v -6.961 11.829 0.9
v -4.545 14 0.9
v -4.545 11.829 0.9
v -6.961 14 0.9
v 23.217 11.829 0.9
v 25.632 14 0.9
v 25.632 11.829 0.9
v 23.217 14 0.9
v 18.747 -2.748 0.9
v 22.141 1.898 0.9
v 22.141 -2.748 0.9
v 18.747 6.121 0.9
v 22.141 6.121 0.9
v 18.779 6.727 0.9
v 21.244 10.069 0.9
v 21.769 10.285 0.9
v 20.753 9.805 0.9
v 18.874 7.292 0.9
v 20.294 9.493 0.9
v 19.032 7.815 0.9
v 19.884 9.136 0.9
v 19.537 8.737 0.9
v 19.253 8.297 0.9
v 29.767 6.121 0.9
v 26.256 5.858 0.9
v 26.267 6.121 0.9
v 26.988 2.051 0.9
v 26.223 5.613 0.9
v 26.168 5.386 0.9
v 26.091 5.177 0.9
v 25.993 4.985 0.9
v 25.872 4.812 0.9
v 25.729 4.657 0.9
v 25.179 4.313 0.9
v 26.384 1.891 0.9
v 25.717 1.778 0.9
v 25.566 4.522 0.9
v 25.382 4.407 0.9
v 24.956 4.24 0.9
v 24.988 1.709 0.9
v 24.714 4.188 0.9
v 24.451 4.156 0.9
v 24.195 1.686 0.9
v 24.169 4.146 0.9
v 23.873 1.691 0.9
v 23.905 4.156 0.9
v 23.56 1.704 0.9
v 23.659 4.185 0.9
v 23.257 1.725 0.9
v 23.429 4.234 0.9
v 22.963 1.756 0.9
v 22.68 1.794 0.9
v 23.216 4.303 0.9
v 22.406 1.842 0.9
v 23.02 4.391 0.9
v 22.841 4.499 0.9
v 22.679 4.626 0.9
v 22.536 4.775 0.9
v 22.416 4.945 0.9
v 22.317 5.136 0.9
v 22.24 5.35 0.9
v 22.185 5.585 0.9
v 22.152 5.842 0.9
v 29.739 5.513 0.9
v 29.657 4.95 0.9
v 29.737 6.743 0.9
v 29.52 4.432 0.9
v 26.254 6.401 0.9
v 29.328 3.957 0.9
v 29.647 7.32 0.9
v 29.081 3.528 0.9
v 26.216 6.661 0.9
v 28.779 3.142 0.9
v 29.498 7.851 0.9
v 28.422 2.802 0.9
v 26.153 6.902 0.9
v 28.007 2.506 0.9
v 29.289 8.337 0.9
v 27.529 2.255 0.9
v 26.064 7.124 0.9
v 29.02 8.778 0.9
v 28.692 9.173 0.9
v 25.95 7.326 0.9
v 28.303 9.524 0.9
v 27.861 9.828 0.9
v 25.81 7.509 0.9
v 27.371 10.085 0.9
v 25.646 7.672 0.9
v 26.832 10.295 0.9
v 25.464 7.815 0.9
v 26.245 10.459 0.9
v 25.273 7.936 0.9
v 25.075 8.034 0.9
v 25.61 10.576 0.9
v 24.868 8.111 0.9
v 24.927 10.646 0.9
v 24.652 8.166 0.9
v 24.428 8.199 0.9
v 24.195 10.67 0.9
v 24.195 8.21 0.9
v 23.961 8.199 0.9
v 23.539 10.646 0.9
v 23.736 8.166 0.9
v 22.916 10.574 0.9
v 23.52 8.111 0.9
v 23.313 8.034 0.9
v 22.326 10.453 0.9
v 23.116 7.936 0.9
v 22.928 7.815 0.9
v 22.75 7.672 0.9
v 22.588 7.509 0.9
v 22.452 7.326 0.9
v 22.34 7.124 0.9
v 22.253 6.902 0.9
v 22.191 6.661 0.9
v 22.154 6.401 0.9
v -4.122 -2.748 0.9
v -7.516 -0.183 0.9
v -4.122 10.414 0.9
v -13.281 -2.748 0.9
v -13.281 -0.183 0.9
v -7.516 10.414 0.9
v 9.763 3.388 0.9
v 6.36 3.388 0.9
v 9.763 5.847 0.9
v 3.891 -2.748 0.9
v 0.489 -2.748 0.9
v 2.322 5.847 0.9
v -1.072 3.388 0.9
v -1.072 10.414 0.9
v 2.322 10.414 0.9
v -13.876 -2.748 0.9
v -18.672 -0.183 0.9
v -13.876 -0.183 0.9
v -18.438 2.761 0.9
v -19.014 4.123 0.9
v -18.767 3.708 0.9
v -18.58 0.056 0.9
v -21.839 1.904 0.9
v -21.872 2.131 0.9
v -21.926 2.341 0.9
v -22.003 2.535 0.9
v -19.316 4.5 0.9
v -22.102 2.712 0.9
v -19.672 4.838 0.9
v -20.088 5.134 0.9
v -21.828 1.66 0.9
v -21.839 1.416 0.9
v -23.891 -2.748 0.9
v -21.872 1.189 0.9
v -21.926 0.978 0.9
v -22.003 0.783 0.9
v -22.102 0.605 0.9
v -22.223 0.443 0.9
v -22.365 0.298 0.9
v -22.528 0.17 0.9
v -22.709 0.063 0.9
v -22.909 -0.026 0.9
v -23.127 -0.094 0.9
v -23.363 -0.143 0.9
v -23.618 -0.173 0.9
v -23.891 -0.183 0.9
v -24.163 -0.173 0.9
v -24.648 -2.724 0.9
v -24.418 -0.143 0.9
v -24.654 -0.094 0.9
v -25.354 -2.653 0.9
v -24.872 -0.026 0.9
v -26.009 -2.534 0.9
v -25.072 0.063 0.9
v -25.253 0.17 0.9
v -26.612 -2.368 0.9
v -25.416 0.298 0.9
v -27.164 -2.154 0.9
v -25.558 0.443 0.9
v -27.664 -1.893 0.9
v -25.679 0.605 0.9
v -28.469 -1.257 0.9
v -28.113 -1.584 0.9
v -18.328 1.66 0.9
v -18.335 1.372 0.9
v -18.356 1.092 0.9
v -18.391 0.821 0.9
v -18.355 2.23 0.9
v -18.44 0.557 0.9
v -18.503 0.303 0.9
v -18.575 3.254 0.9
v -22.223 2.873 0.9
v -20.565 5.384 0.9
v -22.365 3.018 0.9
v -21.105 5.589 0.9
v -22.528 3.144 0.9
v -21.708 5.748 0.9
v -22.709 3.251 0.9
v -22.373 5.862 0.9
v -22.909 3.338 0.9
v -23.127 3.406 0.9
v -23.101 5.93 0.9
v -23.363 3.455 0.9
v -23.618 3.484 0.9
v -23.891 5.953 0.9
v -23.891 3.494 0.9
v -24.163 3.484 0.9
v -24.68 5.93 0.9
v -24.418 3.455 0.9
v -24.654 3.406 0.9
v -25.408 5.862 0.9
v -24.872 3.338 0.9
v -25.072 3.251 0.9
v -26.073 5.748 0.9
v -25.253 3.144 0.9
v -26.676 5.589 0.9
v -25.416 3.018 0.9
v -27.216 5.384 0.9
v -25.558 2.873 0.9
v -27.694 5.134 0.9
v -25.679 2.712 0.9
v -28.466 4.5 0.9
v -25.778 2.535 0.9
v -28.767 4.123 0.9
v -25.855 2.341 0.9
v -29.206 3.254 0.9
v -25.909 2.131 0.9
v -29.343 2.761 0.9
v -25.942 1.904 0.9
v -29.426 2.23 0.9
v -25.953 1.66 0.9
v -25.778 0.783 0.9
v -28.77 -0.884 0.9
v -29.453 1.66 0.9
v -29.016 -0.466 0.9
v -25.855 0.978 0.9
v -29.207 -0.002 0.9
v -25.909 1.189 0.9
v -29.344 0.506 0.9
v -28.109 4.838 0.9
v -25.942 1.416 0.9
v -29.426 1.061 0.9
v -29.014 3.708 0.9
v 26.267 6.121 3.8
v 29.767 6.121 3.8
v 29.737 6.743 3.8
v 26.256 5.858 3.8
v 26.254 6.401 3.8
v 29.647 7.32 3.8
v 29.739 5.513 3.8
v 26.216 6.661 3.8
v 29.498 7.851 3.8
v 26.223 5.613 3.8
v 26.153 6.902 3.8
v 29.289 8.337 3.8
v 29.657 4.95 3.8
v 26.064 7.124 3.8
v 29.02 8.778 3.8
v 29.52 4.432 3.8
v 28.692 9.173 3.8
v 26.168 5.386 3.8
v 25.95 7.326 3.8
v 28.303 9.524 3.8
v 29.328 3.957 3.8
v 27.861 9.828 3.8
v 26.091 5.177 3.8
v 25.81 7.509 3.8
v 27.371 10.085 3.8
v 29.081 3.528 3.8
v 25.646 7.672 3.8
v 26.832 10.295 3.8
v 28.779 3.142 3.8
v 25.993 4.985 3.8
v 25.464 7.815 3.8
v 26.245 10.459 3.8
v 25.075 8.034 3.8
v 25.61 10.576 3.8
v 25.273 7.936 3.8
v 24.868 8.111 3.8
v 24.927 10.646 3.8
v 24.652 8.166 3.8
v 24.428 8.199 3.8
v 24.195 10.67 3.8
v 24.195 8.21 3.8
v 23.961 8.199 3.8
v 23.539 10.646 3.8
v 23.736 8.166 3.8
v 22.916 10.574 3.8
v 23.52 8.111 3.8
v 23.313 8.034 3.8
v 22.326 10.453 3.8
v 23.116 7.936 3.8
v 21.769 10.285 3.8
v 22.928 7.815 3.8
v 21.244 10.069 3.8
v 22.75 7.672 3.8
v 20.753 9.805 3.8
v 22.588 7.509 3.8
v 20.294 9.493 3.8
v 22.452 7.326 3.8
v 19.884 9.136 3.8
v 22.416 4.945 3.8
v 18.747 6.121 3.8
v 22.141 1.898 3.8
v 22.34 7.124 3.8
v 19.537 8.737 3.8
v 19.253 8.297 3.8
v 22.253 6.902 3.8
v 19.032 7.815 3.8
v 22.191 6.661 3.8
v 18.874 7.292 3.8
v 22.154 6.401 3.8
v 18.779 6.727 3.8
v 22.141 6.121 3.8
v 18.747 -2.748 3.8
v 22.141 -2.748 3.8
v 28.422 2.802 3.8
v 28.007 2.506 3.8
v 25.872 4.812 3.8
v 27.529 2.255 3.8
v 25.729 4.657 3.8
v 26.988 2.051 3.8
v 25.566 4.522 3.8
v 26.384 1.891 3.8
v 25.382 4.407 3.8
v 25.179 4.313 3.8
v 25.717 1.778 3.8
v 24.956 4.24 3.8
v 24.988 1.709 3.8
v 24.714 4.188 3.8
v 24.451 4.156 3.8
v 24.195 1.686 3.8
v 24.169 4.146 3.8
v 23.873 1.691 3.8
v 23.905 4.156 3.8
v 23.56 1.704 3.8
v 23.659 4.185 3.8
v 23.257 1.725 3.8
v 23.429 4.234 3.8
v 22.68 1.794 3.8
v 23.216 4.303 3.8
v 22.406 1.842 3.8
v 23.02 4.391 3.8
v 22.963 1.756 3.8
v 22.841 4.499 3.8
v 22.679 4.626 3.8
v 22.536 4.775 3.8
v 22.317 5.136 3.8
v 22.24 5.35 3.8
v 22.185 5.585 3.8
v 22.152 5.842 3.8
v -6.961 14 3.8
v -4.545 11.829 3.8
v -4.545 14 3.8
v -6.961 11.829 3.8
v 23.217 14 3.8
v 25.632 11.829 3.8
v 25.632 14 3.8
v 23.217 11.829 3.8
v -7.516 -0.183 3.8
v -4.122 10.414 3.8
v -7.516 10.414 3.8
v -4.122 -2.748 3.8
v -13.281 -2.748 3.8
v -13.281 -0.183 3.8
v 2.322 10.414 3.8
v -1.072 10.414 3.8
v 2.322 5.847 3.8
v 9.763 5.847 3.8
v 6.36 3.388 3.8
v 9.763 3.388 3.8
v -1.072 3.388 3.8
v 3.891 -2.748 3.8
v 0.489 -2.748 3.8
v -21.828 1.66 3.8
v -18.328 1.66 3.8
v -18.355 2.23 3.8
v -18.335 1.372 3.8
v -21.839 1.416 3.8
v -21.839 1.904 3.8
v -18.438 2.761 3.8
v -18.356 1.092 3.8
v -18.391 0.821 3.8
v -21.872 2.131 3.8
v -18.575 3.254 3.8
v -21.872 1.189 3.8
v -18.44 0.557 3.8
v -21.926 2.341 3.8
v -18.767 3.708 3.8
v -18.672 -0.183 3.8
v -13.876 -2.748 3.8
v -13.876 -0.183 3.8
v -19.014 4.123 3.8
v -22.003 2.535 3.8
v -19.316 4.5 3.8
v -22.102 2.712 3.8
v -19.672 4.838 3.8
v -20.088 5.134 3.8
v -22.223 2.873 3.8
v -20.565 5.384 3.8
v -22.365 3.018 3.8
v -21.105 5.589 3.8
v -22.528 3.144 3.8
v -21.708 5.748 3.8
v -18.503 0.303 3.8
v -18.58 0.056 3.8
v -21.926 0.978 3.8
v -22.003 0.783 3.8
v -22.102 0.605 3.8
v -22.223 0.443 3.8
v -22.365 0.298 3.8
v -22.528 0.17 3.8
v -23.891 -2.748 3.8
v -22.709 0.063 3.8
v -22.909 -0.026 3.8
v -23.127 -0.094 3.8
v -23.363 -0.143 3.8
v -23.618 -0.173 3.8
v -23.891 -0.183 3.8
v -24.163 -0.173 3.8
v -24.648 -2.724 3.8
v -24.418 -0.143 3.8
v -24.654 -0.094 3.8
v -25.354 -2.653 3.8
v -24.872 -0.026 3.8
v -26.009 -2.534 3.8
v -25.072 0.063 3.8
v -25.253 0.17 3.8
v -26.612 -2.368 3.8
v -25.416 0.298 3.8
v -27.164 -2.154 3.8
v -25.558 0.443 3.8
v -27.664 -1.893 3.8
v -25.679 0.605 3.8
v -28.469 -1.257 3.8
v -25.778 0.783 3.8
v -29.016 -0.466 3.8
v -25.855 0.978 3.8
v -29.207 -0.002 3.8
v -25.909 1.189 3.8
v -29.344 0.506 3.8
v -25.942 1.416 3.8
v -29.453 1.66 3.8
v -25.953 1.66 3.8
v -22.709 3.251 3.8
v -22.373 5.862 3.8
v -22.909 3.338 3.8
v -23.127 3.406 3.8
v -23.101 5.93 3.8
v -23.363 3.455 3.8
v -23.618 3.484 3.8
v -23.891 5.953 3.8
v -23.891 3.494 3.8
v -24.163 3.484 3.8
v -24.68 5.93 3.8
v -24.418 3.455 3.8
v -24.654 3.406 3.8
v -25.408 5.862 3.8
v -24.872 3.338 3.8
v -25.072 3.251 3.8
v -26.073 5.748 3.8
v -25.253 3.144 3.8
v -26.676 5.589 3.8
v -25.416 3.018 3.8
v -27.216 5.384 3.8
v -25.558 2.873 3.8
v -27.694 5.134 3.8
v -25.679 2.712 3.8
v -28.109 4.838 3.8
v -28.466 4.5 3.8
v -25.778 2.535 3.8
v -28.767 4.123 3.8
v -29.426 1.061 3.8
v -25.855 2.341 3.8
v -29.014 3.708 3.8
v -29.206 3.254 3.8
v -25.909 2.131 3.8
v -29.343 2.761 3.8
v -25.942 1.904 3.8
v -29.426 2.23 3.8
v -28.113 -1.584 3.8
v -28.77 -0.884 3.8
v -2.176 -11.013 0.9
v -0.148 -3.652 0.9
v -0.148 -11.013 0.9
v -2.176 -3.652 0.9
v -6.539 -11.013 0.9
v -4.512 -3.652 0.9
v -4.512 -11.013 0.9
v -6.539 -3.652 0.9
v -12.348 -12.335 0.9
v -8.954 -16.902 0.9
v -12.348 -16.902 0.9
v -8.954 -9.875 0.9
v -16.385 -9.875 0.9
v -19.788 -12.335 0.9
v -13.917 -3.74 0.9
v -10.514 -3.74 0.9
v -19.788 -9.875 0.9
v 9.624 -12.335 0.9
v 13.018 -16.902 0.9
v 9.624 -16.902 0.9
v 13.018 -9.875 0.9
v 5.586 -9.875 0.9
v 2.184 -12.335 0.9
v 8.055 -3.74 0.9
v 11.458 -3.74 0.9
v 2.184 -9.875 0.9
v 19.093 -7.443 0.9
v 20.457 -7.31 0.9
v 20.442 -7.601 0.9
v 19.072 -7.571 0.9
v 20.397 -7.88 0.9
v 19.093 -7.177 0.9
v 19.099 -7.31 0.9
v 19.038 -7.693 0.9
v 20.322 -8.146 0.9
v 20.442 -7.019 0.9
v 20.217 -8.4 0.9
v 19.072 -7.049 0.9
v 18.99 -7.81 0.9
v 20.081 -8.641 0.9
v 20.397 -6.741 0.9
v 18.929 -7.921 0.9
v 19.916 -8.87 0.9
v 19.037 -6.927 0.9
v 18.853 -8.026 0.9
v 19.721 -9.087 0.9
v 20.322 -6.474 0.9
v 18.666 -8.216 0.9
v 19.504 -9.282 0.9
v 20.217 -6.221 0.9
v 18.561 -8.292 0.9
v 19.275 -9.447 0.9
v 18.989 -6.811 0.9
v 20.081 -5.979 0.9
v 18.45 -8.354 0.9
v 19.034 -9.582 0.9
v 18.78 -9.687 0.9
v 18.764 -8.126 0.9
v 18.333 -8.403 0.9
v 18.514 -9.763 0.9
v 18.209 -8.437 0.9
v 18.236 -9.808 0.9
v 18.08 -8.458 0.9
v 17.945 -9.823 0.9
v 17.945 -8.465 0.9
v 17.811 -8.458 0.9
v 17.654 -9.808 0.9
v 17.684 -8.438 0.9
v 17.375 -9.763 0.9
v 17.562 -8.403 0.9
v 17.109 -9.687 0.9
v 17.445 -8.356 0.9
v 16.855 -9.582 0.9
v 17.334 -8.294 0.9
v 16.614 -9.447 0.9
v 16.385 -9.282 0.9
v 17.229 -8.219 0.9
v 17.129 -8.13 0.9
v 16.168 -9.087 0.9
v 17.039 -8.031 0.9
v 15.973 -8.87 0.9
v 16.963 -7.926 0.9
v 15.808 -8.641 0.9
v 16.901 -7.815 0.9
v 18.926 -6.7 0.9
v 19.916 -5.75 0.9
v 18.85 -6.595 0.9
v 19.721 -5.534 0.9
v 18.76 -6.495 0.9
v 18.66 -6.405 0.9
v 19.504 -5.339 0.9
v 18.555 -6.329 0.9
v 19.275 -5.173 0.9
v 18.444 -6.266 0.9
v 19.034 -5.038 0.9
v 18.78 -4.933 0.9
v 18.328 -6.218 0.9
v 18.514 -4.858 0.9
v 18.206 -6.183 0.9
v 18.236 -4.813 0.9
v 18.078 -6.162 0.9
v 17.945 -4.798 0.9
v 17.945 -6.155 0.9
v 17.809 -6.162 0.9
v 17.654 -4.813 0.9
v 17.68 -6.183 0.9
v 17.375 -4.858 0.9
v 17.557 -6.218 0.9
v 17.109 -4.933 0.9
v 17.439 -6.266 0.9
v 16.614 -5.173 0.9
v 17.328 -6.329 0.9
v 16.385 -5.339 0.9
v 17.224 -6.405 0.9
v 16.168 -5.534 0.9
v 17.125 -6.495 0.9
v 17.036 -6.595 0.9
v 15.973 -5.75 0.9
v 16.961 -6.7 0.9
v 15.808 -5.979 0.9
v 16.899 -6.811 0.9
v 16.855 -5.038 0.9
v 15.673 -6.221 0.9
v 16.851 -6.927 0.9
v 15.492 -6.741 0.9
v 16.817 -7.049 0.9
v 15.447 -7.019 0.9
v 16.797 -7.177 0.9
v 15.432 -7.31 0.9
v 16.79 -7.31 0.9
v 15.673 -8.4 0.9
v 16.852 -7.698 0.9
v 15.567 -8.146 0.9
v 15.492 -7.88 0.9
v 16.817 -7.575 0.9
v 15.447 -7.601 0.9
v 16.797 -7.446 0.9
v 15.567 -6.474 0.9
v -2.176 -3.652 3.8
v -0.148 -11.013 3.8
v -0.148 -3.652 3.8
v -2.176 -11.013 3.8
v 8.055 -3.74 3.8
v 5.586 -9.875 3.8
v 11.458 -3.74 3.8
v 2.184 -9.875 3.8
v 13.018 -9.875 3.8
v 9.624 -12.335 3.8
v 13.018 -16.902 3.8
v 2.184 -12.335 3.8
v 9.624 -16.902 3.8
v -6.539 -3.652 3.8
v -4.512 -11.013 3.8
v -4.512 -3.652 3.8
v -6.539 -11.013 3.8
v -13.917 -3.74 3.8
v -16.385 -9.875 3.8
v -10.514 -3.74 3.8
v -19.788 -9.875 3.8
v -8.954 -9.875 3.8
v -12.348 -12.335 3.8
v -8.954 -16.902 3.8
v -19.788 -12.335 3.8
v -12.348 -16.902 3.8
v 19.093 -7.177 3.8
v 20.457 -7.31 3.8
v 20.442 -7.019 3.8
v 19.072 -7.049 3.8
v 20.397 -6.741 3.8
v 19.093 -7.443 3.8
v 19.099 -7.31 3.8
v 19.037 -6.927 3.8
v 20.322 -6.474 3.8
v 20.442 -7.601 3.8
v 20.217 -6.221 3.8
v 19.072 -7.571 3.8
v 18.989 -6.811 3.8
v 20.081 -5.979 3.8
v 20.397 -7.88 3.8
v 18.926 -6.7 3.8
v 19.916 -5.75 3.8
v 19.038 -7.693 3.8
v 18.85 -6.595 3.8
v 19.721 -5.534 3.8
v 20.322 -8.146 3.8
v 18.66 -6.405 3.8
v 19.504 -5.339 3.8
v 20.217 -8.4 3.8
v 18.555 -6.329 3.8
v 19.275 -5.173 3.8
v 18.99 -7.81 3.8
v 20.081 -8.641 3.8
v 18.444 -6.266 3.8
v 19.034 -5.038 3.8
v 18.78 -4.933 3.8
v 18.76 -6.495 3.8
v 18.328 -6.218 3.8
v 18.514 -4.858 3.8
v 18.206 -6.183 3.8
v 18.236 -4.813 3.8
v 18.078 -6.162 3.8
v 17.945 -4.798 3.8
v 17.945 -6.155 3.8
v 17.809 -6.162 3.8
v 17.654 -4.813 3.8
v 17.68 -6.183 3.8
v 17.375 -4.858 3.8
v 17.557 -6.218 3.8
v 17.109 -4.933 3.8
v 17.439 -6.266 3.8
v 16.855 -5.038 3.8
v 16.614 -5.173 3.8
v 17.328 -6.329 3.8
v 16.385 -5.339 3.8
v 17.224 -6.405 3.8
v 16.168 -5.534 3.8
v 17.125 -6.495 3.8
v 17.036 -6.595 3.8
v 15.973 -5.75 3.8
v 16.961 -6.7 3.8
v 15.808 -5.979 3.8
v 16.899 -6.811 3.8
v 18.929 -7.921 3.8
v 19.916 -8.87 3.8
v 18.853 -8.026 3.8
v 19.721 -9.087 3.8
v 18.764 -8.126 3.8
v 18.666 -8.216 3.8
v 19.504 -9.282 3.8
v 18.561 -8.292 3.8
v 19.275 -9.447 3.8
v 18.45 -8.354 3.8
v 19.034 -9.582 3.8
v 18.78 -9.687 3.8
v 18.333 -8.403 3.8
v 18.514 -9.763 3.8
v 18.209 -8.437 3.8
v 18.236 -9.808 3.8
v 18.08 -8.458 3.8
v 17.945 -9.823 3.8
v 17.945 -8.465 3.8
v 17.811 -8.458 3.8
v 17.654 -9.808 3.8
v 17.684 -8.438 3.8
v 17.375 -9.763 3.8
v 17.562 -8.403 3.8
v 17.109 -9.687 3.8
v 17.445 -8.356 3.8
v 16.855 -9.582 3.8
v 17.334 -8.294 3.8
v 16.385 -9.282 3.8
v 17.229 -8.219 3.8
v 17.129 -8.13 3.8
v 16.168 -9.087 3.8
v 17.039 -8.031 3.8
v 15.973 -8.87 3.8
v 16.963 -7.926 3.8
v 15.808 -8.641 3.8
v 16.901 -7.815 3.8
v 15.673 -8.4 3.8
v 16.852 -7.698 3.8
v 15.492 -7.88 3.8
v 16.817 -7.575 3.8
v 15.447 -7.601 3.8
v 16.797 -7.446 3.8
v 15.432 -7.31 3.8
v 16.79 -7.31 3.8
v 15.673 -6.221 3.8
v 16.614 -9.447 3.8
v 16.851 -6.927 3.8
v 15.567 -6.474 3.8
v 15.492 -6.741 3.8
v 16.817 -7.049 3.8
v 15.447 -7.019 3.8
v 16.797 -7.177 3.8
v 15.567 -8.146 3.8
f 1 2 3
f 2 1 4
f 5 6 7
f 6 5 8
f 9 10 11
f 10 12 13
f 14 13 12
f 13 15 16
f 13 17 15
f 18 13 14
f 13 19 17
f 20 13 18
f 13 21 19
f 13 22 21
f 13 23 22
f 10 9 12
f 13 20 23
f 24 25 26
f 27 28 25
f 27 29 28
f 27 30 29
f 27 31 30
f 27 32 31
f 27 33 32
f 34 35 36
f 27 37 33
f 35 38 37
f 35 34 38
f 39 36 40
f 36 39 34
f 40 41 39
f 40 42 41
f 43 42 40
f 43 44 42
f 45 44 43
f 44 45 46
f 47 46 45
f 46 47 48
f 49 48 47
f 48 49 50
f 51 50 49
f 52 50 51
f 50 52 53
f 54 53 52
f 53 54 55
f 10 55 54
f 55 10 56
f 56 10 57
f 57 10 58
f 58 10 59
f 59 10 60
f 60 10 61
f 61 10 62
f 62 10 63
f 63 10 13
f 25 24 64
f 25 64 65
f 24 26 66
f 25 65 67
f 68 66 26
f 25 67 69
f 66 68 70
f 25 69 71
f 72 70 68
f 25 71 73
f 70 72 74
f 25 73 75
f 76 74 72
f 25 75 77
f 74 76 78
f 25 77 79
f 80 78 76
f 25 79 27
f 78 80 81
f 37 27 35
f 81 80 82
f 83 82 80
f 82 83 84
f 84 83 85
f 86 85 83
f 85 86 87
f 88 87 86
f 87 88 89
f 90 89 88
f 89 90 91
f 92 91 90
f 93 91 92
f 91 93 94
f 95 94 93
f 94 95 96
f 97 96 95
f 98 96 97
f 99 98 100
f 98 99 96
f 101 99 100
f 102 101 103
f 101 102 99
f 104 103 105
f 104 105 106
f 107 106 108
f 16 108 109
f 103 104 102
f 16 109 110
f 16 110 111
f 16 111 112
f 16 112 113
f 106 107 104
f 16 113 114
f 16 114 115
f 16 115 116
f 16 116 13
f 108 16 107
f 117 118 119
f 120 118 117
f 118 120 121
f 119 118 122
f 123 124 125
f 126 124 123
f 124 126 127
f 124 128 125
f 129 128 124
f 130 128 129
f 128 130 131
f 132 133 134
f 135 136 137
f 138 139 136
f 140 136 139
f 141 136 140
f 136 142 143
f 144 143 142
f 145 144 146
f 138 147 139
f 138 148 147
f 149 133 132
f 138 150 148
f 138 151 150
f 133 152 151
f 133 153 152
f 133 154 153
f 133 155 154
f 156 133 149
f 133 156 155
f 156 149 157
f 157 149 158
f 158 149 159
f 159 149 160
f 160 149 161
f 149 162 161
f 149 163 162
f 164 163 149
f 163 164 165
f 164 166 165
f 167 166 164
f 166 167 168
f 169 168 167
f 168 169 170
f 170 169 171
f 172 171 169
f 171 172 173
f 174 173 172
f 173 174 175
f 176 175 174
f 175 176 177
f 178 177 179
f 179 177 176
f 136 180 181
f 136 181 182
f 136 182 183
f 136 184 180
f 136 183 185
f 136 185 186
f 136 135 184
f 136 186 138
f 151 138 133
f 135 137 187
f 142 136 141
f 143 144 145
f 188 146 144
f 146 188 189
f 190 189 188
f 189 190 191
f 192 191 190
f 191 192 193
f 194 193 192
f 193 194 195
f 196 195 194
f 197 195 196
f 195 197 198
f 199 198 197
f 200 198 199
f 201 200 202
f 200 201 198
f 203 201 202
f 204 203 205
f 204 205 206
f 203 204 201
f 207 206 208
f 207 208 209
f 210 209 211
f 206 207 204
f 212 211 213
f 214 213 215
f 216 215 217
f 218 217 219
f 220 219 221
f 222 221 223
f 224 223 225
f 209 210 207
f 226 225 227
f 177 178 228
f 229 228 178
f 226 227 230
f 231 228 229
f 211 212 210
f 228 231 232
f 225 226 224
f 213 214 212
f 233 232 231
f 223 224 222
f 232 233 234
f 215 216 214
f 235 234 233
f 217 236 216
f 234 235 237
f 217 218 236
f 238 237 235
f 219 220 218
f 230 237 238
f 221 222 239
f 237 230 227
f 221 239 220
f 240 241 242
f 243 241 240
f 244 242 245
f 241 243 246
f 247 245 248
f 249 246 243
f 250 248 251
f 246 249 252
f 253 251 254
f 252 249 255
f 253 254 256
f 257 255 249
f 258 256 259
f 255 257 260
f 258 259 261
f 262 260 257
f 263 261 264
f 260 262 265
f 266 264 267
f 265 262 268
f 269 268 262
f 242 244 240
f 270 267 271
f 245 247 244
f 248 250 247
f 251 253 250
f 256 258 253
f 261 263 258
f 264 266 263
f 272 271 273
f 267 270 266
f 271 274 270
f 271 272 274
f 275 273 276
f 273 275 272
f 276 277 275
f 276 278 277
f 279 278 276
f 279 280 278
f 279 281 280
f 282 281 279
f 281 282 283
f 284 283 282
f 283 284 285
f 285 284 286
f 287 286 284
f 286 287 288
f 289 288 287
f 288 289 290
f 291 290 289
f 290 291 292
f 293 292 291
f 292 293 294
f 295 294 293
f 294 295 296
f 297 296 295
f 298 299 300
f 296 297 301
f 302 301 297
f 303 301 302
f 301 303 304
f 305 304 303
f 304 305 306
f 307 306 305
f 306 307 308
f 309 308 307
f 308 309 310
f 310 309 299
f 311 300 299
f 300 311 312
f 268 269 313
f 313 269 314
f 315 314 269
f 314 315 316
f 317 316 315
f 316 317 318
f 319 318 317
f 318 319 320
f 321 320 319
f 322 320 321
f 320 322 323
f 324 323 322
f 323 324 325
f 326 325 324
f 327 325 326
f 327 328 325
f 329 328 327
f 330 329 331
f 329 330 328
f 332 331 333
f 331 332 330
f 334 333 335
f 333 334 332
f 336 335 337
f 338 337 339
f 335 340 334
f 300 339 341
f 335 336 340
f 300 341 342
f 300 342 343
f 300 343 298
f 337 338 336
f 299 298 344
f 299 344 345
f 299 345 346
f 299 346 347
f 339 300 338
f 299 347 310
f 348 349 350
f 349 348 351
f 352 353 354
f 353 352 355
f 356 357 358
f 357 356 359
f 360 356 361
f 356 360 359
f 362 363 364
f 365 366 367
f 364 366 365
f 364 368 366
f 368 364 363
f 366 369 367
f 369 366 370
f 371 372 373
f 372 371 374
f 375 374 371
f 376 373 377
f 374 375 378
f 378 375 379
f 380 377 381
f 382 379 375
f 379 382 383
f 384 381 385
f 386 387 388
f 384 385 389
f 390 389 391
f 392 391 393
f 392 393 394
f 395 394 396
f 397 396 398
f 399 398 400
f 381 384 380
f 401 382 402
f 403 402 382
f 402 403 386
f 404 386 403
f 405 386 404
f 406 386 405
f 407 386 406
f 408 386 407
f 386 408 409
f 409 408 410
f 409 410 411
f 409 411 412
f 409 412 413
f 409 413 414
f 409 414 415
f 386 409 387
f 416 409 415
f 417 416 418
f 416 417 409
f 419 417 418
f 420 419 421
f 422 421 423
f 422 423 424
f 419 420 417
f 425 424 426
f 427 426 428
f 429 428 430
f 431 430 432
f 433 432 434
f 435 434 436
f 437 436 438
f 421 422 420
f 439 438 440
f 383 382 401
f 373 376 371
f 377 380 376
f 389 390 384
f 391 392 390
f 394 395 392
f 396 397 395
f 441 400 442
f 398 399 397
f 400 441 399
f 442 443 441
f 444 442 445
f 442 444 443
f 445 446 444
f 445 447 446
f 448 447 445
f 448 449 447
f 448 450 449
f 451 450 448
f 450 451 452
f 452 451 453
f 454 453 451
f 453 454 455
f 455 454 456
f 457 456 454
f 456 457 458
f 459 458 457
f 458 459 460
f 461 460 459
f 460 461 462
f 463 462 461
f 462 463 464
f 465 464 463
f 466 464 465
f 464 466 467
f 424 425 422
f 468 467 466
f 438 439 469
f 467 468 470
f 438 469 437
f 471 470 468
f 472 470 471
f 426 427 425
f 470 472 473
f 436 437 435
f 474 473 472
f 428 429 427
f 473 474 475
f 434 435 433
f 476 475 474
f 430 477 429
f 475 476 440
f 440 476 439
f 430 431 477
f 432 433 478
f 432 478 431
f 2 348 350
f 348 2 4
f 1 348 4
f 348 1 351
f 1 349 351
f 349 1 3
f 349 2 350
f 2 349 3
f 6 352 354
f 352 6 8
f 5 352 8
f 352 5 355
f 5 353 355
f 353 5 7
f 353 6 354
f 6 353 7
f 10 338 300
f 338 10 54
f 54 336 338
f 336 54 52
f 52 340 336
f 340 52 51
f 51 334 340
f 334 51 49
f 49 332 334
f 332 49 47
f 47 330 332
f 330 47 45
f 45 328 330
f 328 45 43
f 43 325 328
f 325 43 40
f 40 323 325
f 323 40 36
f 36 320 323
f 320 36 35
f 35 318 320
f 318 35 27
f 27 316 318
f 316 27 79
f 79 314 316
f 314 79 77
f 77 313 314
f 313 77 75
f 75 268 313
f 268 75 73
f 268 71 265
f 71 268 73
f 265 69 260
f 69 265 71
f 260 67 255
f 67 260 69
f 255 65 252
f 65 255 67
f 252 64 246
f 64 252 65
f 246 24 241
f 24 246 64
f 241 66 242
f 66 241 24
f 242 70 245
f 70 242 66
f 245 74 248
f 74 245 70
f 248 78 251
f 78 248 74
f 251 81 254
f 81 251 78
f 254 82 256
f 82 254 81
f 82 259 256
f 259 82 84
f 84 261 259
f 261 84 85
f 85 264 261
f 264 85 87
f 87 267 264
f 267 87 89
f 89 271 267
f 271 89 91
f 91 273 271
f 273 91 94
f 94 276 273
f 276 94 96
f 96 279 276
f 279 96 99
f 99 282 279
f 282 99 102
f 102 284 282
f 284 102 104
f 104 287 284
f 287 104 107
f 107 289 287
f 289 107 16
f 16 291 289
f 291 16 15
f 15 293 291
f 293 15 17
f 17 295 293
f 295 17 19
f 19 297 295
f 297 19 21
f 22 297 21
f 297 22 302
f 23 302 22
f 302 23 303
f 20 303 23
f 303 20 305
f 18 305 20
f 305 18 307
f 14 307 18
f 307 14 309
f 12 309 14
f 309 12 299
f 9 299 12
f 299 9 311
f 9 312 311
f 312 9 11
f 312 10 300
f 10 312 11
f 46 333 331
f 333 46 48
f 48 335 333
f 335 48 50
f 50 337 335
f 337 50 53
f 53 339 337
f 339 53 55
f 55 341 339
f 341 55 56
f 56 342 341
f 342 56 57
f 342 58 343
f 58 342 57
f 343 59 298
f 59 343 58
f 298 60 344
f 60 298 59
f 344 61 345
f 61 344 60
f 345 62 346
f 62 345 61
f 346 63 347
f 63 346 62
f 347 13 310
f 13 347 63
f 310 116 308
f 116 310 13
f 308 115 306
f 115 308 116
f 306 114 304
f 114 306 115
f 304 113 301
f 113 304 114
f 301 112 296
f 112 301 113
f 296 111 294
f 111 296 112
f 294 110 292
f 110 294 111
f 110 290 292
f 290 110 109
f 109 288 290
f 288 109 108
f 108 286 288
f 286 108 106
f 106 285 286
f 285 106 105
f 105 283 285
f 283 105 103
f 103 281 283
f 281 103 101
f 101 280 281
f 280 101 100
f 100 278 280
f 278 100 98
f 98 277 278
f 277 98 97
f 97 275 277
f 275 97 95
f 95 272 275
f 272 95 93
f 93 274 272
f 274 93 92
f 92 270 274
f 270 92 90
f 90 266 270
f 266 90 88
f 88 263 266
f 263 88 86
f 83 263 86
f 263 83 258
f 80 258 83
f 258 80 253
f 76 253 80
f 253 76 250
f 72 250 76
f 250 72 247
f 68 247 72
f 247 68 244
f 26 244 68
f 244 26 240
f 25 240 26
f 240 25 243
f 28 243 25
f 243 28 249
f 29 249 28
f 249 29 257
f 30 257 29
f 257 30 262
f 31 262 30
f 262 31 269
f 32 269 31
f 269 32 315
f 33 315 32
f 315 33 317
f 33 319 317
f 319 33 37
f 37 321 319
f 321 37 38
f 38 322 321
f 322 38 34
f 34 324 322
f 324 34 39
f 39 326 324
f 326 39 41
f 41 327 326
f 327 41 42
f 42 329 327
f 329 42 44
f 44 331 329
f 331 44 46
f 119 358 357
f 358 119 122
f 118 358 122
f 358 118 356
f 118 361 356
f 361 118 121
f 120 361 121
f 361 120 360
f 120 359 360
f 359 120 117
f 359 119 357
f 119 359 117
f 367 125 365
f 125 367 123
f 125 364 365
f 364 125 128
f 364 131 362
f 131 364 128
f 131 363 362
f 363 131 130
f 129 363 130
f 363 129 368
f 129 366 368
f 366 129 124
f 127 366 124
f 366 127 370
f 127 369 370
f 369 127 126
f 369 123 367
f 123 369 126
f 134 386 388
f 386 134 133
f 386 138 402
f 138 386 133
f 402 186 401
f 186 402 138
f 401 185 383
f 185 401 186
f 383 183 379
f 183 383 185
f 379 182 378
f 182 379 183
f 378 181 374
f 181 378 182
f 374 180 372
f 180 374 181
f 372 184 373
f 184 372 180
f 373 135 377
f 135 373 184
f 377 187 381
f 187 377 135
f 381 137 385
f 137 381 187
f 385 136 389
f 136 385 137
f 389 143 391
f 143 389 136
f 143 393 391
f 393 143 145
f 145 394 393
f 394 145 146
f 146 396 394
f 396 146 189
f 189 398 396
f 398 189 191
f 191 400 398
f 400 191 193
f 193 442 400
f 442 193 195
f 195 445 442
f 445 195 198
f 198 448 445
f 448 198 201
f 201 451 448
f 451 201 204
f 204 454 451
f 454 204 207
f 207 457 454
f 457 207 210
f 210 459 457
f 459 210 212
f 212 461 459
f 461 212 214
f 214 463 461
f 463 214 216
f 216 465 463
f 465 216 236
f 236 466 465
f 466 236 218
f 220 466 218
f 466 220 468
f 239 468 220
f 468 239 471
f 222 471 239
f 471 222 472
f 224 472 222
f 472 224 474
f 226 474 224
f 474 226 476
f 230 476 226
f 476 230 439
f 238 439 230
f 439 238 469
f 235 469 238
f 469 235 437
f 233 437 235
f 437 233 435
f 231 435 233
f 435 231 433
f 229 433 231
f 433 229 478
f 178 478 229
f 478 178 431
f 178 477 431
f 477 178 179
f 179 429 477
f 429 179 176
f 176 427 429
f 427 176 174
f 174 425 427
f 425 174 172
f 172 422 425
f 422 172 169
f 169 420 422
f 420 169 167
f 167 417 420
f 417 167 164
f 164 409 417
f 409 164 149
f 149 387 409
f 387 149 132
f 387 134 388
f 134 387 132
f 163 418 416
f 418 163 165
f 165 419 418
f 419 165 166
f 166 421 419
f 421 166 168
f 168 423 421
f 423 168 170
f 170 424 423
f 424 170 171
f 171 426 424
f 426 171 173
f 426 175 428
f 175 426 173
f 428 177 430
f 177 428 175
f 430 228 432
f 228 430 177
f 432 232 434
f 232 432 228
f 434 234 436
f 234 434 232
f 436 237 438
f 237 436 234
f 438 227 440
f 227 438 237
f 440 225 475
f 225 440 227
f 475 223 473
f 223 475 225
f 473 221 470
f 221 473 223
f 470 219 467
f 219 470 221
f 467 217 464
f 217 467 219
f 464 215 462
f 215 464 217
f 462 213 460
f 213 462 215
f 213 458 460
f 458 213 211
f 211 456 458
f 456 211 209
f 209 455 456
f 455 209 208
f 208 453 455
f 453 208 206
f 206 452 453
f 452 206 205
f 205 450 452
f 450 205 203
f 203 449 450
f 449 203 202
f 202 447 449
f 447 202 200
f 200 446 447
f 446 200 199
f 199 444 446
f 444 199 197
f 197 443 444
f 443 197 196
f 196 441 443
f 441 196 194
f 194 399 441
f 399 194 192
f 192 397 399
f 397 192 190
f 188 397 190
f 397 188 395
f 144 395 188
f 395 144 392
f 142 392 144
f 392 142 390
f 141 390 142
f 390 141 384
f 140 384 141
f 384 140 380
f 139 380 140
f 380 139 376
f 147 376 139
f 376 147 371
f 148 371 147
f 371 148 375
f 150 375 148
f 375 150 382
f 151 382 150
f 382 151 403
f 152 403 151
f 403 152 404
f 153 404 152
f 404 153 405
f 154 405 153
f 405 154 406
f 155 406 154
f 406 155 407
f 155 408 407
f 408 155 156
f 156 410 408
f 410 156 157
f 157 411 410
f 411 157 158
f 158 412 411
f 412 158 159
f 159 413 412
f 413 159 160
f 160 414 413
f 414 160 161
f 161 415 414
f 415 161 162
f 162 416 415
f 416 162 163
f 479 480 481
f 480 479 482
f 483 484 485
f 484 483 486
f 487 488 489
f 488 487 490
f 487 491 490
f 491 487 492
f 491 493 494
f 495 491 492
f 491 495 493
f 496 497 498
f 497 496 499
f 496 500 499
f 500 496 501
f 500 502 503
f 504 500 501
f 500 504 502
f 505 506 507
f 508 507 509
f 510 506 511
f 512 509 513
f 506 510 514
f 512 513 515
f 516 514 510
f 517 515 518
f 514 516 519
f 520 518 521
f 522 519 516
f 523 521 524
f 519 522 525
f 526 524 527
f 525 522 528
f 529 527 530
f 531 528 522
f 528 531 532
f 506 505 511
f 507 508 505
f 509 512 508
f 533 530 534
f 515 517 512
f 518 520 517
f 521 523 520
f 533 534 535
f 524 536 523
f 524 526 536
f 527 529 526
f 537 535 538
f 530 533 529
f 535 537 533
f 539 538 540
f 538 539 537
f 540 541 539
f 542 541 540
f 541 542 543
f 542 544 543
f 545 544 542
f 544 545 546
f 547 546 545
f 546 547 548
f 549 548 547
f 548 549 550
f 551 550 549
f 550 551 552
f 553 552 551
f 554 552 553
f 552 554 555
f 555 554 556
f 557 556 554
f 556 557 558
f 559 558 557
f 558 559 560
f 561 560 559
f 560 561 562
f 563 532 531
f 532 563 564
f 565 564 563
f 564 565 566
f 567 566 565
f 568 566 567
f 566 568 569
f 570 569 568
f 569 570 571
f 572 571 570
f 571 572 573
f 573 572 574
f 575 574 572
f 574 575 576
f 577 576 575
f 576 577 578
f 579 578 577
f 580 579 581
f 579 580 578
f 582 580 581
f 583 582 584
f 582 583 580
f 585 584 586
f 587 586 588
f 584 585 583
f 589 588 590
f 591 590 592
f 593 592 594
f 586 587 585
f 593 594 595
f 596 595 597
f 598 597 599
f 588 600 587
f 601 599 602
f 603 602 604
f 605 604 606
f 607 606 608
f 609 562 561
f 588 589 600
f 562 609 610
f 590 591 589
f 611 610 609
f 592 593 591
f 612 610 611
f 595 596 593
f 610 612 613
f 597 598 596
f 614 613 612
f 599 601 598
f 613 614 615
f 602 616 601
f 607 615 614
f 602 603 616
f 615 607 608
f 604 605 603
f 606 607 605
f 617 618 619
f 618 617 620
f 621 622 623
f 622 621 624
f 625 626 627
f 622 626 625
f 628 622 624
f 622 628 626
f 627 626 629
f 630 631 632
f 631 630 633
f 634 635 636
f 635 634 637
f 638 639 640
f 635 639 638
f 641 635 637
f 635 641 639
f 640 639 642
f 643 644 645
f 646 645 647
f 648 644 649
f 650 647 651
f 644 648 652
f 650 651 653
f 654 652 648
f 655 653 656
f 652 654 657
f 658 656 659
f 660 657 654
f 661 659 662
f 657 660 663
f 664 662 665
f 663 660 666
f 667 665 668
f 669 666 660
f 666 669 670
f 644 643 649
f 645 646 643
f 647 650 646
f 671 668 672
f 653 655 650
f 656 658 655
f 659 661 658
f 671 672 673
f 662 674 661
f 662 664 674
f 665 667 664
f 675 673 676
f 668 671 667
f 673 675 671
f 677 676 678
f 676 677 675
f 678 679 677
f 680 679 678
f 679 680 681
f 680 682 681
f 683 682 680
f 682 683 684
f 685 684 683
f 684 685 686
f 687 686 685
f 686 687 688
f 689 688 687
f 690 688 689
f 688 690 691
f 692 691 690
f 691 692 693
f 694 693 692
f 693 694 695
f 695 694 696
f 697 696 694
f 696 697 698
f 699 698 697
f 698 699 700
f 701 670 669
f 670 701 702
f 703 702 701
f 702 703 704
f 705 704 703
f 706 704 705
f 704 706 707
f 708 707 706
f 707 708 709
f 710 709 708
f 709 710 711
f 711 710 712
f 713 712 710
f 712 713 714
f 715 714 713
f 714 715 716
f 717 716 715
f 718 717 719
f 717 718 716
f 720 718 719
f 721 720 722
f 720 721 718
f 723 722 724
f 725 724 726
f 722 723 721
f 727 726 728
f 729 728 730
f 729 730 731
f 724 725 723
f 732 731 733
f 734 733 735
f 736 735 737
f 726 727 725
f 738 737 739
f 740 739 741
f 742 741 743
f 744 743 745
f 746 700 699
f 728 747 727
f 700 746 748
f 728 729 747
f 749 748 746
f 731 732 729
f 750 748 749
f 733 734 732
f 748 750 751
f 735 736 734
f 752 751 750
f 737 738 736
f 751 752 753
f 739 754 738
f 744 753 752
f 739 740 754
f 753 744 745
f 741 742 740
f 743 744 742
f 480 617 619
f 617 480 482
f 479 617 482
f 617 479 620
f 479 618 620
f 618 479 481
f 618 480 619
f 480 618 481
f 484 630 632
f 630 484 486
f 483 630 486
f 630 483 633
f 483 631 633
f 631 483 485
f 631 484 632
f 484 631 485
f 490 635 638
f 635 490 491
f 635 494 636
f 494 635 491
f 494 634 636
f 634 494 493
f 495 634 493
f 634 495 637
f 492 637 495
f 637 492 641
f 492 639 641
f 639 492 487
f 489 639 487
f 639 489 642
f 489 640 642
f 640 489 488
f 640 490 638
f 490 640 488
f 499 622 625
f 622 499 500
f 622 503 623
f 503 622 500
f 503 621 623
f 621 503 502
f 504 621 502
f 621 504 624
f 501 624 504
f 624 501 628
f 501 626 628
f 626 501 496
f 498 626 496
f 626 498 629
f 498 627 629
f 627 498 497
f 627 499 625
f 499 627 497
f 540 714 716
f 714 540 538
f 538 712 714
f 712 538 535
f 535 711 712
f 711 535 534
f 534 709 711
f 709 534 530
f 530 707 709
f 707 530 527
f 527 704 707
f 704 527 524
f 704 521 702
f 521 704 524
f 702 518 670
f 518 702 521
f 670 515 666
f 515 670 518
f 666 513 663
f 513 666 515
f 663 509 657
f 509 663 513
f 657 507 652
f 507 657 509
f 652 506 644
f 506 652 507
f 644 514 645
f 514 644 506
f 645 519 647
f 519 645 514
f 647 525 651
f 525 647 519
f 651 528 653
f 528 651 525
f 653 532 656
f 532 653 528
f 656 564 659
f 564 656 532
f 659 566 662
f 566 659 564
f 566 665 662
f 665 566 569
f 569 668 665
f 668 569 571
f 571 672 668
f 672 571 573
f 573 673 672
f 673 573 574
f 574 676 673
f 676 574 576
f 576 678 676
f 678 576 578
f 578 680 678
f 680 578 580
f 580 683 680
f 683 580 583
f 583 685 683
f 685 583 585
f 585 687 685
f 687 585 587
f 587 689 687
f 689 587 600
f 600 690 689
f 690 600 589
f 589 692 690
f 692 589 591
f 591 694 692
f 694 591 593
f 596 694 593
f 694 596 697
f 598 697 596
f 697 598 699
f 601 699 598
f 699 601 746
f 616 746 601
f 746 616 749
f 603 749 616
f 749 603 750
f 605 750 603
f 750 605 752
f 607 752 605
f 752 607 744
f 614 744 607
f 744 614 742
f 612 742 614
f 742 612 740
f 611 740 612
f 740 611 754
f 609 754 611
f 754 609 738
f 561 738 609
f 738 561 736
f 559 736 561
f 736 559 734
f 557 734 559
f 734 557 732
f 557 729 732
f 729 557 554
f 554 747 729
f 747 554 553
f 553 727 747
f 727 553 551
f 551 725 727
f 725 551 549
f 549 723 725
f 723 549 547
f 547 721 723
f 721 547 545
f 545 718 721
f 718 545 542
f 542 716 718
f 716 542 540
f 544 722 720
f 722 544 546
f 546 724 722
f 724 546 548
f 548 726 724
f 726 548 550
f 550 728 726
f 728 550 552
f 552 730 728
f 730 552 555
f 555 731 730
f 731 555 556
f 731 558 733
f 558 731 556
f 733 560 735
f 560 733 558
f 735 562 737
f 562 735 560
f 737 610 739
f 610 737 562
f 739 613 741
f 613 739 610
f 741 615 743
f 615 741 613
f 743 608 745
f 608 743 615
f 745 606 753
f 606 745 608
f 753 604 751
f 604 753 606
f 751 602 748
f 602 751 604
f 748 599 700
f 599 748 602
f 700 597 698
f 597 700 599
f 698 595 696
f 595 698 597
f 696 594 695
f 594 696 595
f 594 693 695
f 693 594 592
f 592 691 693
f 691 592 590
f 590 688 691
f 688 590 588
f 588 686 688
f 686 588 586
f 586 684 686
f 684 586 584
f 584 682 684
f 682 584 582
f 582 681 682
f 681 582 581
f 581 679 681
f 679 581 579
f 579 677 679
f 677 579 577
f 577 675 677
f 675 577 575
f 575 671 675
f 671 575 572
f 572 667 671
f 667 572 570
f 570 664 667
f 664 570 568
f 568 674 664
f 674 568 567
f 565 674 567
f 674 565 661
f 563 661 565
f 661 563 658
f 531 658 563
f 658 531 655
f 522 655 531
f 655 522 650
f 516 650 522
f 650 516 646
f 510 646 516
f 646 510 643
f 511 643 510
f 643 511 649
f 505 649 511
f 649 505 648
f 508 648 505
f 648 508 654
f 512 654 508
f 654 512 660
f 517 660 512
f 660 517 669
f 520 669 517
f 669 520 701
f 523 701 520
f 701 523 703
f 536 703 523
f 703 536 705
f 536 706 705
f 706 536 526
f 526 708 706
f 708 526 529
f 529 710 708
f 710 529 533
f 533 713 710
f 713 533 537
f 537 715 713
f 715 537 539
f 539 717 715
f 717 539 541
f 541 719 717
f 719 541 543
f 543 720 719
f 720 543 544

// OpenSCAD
$fn = 48;
  // syllabics (overlaid on icon, tallest)
  translate([0, 5.430, 0.900]) linear_extrude(height=2.900) text("ᓇᒨᔭ ᑮ", size=13.000, halign="center", valign="center", font="Euphemia UCAS:style=Bold");
  translate([0, -10.430, 0.900]) linear_extrude(height=2.900) text("ᔦᐦᔦᐤ", size=13.000, halign="center", valign="center", font="Euphemia UCAS:style=Bold");
